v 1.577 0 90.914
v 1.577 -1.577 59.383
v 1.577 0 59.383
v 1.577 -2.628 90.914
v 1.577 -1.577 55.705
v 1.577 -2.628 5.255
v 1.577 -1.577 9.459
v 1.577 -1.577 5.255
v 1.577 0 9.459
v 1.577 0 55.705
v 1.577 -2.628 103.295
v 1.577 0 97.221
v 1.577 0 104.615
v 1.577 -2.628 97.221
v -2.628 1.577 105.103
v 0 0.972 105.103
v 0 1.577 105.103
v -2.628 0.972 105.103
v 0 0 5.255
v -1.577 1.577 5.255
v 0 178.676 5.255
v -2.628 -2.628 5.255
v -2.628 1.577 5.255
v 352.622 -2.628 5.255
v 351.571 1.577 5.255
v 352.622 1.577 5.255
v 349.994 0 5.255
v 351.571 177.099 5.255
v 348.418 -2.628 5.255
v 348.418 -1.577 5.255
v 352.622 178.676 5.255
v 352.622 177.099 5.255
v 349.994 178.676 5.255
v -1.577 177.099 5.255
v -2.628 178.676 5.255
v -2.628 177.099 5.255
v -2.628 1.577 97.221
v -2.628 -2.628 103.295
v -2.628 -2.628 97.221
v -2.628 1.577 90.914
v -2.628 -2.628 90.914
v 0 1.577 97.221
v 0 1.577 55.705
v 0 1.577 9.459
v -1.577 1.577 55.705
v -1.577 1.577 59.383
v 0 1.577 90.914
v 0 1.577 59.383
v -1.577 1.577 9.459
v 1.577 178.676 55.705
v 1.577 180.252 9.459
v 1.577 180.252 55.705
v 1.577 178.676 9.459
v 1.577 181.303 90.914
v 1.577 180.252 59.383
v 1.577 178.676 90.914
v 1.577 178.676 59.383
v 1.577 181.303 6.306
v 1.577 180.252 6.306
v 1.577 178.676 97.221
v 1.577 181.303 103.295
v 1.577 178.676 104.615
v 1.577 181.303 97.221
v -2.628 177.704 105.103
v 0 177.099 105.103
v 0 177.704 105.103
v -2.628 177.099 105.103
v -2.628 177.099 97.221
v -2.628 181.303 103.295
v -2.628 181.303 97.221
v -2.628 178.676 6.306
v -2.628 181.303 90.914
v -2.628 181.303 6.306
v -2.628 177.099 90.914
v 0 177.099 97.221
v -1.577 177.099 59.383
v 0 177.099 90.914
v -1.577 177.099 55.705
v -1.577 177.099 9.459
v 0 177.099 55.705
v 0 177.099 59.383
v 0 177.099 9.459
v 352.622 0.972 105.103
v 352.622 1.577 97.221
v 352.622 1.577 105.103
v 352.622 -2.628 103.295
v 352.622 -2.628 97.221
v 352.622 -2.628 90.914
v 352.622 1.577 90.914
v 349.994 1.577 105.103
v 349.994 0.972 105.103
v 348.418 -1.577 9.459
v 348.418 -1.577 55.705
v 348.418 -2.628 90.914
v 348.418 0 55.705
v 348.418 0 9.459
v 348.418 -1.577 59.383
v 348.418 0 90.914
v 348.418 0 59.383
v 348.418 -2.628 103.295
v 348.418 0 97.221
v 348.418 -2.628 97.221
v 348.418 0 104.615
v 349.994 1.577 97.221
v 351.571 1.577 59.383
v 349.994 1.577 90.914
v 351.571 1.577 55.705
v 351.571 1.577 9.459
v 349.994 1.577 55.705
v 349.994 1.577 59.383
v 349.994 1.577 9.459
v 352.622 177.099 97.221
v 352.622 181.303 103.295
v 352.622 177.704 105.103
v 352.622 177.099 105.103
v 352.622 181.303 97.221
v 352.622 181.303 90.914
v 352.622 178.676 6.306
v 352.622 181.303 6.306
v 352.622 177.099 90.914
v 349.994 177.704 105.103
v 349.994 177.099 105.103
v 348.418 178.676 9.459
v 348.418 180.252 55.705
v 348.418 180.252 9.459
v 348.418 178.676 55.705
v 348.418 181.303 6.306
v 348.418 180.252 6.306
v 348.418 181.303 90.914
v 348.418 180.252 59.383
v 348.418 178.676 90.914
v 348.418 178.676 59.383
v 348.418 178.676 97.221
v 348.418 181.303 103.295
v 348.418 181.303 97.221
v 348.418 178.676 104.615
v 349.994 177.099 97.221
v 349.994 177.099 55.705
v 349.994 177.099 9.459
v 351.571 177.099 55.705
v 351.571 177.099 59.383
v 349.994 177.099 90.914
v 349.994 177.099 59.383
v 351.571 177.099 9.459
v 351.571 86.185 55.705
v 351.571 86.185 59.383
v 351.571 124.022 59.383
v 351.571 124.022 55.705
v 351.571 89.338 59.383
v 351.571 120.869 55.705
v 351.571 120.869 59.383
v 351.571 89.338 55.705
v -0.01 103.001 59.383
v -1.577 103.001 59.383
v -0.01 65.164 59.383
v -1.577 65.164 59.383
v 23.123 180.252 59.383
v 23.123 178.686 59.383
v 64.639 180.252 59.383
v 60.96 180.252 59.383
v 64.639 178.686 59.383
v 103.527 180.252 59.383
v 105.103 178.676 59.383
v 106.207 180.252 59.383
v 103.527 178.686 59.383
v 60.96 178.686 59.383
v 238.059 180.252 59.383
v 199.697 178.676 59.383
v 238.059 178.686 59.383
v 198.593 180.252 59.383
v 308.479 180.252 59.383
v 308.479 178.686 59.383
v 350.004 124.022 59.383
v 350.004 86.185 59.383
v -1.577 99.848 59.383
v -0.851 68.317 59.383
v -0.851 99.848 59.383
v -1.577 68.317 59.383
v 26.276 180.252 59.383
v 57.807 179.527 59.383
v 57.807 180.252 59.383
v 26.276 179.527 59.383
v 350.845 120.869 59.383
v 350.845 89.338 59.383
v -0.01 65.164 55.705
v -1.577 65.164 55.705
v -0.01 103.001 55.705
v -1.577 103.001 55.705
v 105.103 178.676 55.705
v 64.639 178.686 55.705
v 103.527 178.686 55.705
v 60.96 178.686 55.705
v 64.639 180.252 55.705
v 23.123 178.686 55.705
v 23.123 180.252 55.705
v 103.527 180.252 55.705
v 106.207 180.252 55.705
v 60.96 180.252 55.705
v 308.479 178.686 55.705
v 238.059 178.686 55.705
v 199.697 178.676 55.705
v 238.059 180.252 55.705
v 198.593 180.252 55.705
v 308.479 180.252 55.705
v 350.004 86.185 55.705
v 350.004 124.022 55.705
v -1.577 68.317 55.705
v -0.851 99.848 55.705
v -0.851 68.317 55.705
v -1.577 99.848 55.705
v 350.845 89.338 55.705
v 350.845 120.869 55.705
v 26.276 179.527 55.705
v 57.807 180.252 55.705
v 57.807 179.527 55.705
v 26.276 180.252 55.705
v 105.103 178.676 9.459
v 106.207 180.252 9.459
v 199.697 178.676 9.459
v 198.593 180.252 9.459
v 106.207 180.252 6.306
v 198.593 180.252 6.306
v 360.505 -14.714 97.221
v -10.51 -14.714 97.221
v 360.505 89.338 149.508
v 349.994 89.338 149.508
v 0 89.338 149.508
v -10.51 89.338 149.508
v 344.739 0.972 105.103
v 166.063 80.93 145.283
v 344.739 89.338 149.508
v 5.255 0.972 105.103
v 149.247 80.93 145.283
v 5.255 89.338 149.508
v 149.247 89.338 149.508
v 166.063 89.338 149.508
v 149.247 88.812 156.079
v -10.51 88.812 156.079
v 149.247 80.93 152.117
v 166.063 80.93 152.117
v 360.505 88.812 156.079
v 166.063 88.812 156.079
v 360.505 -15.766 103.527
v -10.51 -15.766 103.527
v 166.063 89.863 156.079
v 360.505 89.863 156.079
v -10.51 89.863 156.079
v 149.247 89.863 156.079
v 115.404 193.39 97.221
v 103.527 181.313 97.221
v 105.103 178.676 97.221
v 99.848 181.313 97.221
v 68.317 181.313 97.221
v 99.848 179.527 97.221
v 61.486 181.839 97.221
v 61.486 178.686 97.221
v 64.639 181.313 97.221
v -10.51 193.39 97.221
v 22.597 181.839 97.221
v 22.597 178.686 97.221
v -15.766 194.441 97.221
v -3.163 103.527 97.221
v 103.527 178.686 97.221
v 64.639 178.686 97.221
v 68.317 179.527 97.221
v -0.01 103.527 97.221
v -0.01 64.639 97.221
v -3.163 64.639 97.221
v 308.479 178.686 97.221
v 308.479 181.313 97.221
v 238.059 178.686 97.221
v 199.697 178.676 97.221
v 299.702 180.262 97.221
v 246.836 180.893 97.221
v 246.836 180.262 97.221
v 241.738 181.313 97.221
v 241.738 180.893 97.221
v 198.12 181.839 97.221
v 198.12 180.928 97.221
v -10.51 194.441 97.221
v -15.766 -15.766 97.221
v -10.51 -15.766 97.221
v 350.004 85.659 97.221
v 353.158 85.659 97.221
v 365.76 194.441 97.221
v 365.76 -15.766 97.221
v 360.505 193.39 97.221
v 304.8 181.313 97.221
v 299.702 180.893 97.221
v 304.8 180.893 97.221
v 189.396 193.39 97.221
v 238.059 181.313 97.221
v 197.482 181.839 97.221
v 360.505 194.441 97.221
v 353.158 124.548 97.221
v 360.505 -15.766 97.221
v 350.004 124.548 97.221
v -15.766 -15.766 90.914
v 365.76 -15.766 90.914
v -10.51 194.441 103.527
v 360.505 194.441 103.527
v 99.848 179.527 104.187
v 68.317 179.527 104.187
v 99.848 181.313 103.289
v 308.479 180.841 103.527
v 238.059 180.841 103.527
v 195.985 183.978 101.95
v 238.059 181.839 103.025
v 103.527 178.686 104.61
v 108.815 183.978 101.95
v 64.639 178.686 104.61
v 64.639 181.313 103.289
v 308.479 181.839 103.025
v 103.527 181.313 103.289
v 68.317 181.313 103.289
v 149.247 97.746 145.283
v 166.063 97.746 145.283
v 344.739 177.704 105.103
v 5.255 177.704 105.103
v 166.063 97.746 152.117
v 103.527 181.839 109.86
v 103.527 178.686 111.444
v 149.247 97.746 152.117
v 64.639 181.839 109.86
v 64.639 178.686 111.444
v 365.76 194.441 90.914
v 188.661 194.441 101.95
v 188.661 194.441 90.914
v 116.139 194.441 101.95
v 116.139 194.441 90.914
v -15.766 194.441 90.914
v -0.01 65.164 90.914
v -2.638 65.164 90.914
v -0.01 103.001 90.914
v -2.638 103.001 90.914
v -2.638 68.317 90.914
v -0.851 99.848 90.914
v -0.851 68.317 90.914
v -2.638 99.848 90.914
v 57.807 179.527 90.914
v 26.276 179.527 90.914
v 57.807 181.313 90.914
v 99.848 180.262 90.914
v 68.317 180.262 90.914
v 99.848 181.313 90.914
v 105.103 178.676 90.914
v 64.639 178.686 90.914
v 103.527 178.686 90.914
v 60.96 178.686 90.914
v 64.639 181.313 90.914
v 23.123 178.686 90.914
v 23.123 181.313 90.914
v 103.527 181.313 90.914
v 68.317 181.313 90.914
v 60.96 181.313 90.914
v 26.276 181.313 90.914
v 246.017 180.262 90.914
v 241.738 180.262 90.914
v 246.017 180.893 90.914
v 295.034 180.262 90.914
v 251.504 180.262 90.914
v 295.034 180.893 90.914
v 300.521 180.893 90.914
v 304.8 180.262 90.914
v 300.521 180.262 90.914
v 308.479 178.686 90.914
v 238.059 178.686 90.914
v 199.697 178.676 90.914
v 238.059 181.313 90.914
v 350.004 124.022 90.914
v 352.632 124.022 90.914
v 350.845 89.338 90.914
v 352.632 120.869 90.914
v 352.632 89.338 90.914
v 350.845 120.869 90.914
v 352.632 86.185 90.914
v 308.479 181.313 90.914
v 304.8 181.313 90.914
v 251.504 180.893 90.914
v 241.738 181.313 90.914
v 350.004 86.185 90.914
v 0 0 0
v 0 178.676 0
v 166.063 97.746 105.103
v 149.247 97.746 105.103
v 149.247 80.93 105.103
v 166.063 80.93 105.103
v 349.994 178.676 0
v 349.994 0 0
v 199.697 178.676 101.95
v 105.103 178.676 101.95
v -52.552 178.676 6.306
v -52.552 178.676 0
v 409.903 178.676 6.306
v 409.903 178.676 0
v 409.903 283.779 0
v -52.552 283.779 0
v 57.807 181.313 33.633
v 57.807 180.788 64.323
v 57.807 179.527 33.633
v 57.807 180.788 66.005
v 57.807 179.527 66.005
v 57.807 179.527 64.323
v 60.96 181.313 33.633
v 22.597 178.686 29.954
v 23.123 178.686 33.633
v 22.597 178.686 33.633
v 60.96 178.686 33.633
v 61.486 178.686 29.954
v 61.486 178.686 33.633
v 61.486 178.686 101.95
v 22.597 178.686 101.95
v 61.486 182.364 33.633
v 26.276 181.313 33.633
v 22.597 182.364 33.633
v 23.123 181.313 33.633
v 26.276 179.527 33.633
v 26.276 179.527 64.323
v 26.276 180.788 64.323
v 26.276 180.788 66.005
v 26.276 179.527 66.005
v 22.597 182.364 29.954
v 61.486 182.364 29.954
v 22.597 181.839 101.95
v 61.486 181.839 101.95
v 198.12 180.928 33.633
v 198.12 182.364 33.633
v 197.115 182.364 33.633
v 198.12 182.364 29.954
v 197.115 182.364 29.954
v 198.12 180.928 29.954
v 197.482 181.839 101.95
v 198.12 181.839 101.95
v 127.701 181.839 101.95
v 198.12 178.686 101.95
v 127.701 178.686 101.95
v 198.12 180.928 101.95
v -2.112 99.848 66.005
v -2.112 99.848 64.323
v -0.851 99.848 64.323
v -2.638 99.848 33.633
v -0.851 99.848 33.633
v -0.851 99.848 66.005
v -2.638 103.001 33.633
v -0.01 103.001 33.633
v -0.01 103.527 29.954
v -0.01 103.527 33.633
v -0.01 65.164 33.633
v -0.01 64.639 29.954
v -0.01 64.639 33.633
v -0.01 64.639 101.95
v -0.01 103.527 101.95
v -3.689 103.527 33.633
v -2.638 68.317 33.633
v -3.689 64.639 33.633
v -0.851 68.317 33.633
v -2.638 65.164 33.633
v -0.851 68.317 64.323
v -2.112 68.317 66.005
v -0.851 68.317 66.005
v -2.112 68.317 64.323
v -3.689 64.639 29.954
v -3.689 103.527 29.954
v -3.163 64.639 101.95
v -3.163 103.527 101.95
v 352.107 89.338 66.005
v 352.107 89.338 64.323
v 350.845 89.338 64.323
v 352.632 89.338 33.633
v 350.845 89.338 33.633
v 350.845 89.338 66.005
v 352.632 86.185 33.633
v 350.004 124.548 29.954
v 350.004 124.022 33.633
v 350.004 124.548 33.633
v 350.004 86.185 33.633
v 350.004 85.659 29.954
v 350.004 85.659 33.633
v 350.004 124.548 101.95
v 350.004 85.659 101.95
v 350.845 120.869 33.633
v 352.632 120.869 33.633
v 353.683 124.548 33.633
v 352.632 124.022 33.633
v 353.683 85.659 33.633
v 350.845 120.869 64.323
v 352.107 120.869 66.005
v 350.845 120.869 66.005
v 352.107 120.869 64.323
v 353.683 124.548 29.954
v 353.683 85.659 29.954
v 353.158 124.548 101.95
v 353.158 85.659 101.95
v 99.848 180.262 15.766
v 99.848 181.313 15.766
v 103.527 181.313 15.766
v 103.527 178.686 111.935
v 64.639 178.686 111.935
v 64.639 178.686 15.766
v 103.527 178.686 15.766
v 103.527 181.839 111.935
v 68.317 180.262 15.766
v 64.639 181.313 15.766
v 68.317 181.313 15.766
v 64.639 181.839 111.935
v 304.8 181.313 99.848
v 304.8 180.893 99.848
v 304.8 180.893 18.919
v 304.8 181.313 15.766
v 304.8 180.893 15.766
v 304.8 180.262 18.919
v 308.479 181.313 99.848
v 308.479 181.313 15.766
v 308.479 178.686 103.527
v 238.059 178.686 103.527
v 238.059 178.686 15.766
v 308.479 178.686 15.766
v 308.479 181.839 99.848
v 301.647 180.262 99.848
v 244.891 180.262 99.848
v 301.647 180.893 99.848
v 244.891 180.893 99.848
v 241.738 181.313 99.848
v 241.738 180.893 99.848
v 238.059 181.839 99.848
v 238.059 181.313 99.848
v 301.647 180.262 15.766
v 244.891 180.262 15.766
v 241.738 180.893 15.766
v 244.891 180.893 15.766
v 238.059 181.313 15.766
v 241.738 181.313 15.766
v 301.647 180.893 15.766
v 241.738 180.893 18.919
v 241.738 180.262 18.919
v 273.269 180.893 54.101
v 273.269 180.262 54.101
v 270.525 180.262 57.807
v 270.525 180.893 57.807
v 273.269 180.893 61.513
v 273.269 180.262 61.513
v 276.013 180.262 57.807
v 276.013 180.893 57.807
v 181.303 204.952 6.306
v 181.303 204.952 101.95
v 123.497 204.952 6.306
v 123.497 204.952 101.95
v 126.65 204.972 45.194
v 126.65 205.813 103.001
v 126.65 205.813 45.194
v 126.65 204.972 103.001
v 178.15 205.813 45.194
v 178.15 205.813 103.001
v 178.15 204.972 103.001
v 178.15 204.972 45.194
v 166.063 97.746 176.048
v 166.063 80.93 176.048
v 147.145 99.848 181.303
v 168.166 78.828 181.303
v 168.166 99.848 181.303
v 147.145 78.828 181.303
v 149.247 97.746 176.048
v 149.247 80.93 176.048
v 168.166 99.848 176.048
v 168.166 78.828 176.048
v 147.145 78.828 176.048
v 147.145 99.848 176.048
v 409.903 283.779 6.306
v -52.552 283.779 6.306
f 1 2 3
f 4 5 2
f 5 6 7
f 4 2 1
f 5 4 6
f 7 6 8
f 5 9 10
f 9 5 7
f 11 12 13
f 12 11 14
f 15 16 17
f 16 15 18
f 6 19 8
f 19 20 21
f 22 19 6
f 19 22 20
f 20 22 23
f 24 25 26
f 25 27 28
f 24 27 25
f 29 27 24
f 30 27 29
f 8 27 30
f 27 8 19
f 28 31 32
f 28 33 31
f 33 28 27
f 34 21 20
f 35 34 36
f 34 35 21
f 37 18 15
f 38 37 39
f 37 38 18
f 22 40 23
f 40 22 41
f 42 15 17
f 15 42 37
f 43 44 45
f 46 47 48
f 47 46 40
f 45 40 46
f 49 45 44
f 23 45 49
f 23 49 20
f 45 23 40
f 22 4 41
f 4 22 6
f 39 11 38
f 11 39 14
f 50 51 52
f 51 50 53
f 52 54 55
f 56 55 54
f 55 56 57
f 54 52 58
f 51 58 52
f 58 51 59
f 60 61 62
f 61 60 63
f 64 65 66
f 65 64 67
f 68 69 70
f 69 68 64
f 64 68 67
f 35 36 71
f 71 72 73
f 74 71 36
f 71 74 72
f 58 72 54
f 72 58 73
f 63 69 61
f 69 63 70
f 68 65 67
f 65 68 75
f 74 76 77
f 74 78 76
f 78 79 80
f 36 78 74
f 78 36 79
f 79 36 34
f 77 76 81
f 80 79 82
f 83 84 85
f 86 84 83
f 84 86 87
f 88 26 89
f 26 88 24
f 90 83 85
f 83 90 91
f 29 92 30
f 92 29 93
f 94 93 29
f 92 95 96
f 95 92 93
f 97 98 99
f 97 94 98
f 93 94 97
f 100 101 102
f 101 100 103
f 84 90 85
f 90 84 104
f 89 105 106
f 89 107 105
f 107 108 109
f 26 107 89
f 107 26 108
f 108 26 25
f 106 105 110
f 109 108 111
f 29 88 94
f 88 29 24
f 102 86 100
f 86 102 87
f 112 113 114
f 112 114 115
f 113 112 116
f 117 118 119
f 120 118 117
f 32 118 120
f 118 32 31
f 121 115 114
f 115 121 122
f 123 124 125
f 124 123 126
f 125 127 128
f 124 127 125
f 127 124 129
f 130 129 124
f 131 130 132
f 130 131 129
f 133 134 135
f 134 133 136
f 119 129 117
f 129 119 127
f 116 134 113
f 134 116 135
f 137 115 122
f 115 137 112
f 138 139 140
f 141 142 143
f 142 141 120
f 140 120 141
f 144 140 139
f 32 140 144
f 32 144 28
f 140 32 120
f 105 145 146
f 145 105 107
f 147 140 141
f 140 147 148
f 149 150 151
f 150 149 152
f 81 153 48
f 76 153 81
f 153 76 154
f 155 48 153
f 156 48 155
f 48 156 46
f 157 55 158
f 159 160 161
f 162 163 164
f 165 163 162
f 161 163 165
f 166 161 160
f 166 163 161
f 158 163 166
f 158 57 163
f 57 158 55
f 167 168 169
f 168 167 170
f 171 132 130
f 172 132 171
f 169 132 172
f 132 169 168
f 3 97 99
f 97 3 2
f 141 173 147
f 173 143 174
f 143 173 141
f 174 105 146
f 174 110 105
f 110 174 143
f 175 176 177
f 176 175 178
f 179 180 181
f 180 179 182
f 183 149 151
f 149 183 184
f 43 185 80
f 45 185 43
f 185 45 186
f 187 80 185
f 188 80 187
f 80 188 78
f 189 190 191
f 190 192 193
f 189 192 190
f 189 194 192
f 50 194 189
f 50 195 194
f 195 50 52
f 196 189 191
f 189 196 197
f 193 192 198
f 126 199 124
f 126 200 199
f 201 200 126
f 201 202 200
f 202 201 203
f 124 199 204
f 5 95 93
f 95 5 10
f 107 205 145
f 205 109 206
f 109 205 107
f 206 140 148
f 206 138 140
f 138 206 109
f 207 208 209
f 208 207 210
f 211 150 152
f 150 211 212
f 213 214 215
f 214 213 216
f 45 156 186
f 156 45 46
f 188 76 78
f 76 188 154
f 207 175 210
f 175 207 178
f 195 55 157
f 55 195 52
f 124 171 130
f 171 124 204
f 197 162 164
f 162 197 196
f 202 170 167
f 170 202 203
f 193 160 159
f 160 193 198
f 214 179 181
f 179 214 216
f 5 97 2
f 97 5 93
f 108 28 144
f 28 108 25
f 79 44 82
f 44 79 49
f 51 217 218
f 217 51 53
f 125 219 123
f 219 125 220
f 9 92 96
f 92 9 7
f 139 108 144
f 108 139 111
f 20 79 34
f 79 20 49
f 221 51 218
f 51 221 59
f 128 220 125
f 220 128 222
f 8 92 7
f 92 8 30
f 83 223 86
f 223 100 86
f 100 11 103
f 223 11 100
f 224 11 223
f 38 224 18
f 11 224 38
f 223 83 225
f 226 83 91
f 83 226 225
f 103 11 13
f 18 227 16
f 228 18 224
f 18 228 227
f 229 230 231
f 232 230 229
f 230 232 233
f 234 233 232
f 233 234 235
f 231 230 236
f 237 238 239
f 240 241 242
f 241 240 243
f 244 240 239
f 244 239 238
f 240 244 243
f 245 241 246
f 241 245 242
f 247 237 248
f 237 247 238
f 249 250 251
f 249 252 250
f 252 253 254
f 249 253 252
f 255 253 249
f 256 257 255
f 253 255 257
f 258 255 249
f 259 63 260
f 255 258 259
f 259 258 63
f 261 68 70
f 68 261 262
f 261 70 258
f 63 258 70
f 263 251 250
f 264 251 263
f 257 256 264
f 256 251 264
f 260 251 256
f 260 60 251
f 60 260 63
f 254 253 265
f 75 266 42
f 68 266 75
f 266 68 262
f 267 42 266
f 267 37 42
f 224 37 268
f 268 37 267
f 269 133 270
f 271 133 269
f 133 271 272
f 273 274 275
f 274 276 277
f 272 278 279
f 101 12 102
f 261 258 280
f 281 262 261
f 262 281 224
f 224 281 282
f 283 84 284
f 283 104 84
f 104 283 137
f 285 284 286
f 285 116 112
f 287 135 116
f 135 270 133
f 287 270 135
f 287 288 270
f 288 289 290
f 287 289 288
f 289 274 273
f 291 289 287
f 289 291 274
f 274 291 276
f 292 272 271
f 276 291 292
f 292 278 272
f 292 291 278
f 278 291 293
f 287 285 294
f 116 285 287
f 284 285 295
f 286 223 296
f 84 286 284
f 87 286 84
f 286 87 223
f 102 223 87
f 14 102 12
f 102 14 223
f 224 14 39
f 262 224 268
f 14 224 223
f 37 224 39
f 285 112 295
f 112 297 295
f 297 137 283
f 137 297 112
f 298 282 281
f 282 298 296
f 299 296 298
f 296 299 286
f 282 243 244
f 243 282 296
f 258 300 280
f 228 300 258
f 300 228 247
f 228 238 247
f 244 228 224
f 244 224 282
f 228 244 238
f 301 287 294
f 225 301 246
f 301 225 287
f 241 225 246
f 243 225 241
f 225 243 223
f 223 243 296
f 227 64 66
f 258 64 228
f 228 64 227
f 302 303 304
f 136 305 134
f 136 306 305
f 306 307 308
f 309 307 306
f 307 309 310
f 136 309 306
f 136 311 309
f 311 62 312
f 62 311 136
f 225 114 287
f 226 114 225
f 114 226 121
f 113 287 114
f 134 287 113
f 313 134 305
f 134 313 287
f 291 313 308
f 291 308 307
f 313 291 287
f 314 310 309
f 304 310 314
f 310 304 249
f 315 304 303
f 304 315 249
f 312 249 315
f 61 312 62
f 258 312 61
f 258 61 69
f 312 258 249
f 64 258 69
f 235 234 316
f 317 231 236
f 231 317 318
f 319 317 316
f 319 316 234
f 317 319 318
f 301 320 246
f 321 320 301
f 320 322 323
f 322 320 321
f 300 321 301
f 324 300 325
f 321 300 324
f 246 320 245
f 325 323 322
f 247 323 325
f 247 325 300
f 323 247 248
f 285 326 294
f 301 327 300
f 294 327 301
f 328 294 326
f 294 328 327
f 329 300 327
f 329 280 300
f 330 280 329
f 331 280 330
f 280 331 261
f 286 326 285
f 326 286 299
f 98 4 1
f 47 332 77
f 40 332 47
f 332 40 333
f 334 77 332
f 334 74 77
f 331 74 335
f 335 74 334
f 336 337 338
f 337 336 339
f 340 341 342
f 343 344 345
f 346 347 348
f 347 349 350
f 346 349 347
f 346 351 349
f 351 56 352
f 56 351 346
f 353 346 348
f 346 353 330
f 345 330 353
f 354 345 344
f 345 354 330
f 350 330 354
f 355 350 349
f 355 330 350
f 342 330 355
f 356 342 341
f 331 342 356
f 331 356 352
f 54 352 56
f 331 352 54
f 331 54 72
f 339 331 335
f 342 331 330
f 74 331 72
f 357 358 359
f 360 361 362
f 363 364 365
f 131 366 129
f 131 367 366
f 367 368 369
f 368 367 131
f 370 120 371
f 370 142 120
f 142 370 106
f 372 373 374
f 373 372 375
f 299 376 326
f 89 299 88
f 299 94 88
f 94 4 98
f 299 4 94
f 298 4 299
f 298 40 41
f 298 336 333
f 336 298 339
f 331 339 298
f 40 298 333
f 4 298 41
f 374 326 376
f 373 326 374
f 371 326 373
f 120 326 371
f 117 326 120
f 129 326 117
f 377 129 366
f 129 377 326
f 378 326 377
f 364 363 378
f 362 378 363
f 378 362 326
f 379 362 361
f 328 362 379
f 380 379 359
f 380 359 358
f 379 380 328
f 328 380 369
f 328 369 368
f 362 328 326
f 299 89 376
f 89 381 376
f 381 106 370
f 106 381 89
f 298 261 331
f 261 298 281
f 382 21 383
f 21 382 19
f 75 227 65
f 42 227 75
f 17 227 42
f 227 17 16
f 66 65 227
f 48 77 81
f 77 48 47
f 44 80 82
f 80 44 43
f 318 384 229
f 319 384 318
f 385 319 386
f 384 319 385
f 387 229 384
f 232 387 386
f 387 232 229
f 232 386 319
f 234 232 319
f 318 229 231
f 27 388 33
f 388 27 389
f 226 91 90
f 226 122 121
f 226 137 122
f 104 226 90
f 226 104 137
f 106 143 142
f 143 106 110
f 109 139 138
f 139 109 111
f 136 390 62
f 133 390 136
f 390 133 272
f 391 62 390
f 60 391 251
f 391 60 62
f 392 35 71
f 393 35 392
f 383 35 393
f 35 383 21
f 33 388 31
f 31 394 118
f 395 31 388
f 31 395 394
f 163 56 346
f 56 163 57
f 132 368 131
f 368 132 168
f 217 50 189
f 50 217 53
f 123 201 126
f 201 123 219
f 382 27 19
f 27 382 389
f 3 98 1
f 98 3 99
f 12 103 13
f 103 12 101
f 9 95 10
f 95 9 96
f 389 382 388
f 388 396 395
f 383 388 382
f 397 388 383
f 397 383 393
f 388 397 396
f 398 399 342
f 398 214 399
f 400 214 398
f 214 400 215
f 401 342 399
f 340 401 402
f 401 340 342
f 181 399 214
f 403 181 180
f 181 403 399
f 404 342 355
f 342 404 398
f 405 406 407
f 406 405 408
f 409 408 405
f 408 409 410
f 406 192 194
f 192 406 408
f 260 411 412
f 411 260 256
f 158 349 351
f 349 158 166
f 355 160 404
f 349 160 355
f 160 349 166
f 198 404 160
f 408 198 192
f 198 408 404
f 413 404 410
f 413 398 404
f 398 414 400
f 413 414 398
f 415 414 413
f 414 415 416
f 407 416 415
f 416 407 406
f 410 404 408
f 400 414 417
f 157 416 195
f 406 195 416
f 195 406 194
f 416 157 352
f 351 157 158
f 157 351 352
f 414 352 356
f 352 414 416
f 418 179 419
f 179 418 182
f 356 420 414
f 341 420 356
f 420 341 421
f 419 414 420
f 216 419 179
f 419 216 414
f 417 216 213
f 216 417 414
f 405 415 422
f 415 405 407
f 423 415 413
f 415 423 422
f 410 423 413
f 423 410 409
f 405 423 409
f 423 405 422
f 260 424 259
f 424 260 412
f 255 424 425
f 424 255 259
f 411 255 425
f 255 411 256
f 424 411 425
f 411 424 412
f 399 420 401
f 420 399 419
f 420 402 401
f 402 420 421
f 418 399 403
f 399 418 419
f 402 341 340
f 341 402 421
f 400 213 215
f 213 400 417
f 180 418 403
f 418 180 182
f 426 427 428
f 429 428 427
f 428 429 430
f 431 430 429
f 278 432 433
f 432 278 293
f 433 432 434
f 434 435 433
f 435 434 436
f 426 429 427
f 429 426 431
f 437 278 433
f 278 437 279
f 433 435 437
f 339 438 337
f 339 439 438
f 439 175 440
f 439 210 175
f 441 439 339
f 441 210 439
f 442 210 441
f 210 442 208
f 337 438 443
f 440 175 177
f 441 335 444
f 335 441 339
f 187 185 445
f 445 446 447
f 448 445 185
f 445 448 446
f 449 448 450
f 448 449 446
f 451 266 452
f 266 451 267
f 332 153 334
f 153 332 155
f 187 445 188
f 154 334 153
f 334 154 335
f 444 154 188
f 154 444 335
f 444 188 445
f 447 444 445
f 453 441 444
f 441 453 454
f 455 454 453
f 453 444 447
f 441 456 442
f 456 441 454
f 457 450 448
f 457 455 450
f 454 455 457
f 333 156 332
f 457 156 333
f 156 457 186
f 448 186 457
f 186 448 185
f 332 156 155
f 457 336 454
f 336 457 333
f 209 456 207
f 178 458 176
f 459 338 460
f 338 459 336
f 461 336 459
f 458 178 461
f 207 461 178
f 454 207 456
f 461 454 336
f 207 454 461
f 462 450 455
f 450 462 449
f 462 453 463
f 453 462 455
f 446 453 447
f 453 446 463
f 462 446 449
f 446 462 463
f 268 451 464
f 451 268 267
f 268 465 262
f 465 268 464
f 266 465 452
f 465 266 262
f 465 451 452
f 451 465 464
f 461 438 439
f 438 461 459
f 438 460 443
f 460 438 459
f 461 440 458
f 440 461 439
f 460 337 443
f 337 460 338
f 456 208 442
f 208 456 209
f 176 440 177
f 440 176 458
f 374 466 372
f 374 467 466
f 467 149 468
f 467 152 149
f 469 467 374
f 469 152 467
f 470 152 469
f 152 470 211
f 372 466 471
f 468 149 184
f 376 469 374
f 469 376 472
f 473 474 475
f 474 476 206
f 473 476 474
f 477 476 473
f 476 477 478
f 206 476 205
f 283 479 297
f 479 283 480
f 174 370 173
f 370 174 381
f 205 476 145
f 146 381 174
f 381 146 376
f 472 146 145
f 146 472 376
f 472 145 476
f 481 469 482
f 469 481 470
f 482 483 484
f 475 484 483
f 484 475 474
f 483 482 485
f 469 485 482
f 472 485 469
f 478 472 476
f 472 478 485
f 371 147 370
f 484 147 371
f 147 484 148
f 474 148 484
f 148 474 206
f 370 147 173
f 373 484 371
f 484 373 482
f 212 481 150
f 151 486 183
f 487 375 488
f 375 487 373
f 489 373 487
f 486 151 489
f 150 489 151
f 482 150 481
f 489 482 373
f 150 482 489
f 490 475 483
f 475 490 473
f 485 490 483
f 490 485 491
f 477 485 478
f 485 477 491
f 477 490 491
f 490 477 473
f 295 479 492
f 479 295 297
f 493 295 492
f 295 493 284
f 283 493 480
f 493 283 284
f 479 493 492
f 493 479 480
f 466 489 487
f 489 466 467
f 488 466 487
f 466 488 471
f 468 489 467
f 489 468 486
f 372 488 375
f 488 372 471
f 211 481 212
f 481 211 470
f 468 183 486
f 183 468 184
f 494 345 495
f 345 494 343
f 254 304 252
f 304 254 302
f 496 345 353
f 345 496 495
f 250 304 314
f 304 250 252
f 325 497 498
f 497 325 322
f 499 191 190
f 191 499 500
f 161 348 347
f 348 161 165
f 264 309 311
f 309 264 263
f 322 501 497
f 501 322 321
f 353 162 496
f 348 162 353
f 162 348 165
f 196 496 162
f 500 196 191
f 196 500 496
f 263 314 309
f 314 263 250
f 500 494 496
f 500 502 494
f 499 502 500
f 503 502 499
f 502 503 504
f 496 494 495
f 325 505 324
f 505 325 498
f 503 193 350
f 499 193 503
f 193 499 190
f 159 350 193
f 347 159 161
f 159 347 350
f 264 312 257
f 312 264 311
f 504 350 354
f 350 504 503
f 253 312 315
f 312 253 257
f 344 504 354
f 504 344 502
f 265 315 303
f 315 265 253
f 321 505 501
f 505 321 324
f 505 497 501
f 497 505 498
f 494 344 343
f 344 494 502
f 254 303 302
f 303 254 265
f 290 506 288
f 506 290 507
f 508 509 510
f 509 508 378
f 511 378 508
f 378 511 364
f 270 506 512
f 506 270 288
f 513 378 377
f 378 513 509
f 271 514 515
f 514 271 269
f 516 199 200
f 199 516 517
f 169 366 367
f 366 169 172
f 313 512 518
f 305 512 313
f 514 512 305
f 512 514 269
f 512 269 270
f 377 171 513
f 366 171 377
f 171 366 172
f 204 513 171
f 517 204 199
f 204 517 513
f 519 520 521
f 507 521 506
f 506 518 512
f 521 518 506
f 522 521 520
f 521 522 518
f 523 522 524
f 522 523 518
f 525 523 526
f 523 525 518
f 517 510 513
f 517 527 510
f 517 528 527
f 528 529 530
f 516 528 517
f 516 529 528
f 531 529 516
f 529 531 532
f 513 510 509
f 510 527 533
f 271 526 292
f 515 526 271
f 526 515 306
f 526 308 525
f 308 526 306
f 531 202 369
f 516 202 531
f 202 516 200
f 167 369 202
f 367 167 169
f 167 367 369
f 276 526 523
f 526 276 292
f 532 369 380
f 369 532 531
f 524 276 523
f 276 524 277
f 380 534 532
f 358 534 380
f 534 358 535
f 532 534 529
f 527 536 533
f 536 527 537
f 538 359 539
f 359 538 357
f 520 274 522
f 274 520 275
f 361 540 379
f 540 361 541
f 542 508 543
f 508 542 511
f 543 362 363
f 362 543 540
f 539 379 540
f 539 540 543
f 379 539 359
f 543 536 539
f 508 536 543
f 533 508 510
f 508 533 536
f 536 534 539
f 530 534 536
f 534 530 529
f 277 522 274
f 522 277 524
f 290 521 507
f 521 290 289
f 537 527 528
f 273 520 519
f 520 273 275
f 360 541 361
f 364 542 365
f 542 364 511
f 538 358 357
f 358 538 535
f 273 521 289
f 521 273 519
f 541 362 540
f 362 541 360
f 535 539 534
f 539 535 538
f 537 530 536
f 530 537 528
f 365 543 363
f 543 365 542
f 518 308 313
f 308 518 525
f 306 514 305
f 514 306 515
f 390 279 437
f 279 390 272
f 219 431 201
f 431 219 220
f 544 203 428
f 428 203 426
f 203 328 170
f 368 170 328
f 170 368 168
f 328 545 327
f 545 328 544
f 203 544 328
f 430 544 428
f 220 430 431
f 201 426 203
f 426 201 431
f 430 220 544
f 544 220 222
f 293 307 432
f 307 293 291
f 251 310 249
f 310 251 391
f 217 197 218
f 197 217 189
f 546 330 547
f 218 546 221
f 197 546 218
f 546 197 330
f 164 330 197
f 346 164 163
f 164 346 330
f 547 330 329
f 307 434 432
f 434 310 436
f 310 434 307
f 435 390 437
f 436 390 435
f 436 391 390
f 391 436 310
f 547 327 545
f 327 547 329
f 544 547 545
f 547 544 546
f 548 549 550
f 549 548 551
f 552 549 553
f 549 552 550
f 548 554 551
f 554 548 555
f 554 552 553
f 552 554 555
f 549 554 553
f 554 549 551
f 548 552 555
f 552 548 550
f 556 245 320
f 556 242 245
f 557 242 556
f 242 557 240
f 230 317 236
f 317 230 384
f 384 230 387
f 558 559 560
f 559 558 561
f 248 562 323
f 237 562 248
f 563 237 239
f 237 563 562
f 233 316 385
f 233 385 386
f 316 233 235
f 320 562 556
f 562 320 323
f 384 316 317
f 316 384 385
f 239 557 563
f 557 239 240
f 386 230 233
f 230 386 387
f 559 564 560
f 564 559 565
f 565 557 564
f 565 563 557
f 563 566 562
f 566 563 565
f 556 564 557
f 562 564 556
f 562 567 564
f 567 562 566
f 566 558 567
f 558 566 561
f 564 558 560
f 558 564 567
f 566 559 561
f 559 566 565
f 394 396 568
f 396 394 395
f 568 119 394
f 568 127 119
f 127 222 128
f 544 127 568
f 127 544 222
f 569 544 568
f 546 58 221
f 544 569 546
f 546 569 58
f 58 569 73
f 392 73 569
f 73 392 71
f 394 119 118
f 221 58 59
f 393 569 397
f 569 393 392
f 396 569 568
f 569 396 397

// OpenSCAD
// =====================================================================
//  MILWAUKEE ROAD - STANDARD FRAME PASSENGER STATION 17 X 33 FT 4 IN (C.M.&ST.P. ENGINEERING DEPT., C.1916)
//  Album of Depot Plans (1919), sheet 11. Private reference (in copyright):
//  Research Library / RSW / Stations / Standard depots / Album of Depot Plans 1919.
//  Rib Side Works, 24 Nov 2026. FIRST SHAPE MODEL for review - not cut into print sections.
//  KNOWN (from the sheet): 17 x 33 ft 4 in; waiting room 10, office 9 with bay, baggage and freight room 14 ft 4; asbestos roofing, lap siding; used at Knoke, Iowa (1925), Bethesda, Wis., Dover, S.D..
//  ESTIMATE: wall and ridge heights (sheets are small copies), window spacing, colours.
//  Shared depot builder ../../../_common/rsw_depot.scad (x along the track, y = 0 town side,
//  track side +y, feet).  SCALE: 29 = G, 48 = O, 87 = HO.
// =====================================================================
SCALE = 29;
include <../../../_common/rsw_depot.scad>

depot(blocks = [[0, 33.3, 0, 17, 10, 0.5, 1, 1.5, 0]],
      pavs   = [],
      wins   = [[4, 1, 3, 6, 3.2], [14, 1, 3, 6, 3.2], [17, 1, 3, 6, 3.2], [8, 2, 3, 6, 3.2], [10, 3, 3, 6, 3.2]],
      doors  = [[8, 1, 3, 7.5, 0], [26, 1, 6, 8, 2]],
      bays   = [[14.5, 1, 9, 2.5]],
      chims  = [[15, 8.5, 17.25]],
      plat   = [-5, 44, 10, 0.6]);
